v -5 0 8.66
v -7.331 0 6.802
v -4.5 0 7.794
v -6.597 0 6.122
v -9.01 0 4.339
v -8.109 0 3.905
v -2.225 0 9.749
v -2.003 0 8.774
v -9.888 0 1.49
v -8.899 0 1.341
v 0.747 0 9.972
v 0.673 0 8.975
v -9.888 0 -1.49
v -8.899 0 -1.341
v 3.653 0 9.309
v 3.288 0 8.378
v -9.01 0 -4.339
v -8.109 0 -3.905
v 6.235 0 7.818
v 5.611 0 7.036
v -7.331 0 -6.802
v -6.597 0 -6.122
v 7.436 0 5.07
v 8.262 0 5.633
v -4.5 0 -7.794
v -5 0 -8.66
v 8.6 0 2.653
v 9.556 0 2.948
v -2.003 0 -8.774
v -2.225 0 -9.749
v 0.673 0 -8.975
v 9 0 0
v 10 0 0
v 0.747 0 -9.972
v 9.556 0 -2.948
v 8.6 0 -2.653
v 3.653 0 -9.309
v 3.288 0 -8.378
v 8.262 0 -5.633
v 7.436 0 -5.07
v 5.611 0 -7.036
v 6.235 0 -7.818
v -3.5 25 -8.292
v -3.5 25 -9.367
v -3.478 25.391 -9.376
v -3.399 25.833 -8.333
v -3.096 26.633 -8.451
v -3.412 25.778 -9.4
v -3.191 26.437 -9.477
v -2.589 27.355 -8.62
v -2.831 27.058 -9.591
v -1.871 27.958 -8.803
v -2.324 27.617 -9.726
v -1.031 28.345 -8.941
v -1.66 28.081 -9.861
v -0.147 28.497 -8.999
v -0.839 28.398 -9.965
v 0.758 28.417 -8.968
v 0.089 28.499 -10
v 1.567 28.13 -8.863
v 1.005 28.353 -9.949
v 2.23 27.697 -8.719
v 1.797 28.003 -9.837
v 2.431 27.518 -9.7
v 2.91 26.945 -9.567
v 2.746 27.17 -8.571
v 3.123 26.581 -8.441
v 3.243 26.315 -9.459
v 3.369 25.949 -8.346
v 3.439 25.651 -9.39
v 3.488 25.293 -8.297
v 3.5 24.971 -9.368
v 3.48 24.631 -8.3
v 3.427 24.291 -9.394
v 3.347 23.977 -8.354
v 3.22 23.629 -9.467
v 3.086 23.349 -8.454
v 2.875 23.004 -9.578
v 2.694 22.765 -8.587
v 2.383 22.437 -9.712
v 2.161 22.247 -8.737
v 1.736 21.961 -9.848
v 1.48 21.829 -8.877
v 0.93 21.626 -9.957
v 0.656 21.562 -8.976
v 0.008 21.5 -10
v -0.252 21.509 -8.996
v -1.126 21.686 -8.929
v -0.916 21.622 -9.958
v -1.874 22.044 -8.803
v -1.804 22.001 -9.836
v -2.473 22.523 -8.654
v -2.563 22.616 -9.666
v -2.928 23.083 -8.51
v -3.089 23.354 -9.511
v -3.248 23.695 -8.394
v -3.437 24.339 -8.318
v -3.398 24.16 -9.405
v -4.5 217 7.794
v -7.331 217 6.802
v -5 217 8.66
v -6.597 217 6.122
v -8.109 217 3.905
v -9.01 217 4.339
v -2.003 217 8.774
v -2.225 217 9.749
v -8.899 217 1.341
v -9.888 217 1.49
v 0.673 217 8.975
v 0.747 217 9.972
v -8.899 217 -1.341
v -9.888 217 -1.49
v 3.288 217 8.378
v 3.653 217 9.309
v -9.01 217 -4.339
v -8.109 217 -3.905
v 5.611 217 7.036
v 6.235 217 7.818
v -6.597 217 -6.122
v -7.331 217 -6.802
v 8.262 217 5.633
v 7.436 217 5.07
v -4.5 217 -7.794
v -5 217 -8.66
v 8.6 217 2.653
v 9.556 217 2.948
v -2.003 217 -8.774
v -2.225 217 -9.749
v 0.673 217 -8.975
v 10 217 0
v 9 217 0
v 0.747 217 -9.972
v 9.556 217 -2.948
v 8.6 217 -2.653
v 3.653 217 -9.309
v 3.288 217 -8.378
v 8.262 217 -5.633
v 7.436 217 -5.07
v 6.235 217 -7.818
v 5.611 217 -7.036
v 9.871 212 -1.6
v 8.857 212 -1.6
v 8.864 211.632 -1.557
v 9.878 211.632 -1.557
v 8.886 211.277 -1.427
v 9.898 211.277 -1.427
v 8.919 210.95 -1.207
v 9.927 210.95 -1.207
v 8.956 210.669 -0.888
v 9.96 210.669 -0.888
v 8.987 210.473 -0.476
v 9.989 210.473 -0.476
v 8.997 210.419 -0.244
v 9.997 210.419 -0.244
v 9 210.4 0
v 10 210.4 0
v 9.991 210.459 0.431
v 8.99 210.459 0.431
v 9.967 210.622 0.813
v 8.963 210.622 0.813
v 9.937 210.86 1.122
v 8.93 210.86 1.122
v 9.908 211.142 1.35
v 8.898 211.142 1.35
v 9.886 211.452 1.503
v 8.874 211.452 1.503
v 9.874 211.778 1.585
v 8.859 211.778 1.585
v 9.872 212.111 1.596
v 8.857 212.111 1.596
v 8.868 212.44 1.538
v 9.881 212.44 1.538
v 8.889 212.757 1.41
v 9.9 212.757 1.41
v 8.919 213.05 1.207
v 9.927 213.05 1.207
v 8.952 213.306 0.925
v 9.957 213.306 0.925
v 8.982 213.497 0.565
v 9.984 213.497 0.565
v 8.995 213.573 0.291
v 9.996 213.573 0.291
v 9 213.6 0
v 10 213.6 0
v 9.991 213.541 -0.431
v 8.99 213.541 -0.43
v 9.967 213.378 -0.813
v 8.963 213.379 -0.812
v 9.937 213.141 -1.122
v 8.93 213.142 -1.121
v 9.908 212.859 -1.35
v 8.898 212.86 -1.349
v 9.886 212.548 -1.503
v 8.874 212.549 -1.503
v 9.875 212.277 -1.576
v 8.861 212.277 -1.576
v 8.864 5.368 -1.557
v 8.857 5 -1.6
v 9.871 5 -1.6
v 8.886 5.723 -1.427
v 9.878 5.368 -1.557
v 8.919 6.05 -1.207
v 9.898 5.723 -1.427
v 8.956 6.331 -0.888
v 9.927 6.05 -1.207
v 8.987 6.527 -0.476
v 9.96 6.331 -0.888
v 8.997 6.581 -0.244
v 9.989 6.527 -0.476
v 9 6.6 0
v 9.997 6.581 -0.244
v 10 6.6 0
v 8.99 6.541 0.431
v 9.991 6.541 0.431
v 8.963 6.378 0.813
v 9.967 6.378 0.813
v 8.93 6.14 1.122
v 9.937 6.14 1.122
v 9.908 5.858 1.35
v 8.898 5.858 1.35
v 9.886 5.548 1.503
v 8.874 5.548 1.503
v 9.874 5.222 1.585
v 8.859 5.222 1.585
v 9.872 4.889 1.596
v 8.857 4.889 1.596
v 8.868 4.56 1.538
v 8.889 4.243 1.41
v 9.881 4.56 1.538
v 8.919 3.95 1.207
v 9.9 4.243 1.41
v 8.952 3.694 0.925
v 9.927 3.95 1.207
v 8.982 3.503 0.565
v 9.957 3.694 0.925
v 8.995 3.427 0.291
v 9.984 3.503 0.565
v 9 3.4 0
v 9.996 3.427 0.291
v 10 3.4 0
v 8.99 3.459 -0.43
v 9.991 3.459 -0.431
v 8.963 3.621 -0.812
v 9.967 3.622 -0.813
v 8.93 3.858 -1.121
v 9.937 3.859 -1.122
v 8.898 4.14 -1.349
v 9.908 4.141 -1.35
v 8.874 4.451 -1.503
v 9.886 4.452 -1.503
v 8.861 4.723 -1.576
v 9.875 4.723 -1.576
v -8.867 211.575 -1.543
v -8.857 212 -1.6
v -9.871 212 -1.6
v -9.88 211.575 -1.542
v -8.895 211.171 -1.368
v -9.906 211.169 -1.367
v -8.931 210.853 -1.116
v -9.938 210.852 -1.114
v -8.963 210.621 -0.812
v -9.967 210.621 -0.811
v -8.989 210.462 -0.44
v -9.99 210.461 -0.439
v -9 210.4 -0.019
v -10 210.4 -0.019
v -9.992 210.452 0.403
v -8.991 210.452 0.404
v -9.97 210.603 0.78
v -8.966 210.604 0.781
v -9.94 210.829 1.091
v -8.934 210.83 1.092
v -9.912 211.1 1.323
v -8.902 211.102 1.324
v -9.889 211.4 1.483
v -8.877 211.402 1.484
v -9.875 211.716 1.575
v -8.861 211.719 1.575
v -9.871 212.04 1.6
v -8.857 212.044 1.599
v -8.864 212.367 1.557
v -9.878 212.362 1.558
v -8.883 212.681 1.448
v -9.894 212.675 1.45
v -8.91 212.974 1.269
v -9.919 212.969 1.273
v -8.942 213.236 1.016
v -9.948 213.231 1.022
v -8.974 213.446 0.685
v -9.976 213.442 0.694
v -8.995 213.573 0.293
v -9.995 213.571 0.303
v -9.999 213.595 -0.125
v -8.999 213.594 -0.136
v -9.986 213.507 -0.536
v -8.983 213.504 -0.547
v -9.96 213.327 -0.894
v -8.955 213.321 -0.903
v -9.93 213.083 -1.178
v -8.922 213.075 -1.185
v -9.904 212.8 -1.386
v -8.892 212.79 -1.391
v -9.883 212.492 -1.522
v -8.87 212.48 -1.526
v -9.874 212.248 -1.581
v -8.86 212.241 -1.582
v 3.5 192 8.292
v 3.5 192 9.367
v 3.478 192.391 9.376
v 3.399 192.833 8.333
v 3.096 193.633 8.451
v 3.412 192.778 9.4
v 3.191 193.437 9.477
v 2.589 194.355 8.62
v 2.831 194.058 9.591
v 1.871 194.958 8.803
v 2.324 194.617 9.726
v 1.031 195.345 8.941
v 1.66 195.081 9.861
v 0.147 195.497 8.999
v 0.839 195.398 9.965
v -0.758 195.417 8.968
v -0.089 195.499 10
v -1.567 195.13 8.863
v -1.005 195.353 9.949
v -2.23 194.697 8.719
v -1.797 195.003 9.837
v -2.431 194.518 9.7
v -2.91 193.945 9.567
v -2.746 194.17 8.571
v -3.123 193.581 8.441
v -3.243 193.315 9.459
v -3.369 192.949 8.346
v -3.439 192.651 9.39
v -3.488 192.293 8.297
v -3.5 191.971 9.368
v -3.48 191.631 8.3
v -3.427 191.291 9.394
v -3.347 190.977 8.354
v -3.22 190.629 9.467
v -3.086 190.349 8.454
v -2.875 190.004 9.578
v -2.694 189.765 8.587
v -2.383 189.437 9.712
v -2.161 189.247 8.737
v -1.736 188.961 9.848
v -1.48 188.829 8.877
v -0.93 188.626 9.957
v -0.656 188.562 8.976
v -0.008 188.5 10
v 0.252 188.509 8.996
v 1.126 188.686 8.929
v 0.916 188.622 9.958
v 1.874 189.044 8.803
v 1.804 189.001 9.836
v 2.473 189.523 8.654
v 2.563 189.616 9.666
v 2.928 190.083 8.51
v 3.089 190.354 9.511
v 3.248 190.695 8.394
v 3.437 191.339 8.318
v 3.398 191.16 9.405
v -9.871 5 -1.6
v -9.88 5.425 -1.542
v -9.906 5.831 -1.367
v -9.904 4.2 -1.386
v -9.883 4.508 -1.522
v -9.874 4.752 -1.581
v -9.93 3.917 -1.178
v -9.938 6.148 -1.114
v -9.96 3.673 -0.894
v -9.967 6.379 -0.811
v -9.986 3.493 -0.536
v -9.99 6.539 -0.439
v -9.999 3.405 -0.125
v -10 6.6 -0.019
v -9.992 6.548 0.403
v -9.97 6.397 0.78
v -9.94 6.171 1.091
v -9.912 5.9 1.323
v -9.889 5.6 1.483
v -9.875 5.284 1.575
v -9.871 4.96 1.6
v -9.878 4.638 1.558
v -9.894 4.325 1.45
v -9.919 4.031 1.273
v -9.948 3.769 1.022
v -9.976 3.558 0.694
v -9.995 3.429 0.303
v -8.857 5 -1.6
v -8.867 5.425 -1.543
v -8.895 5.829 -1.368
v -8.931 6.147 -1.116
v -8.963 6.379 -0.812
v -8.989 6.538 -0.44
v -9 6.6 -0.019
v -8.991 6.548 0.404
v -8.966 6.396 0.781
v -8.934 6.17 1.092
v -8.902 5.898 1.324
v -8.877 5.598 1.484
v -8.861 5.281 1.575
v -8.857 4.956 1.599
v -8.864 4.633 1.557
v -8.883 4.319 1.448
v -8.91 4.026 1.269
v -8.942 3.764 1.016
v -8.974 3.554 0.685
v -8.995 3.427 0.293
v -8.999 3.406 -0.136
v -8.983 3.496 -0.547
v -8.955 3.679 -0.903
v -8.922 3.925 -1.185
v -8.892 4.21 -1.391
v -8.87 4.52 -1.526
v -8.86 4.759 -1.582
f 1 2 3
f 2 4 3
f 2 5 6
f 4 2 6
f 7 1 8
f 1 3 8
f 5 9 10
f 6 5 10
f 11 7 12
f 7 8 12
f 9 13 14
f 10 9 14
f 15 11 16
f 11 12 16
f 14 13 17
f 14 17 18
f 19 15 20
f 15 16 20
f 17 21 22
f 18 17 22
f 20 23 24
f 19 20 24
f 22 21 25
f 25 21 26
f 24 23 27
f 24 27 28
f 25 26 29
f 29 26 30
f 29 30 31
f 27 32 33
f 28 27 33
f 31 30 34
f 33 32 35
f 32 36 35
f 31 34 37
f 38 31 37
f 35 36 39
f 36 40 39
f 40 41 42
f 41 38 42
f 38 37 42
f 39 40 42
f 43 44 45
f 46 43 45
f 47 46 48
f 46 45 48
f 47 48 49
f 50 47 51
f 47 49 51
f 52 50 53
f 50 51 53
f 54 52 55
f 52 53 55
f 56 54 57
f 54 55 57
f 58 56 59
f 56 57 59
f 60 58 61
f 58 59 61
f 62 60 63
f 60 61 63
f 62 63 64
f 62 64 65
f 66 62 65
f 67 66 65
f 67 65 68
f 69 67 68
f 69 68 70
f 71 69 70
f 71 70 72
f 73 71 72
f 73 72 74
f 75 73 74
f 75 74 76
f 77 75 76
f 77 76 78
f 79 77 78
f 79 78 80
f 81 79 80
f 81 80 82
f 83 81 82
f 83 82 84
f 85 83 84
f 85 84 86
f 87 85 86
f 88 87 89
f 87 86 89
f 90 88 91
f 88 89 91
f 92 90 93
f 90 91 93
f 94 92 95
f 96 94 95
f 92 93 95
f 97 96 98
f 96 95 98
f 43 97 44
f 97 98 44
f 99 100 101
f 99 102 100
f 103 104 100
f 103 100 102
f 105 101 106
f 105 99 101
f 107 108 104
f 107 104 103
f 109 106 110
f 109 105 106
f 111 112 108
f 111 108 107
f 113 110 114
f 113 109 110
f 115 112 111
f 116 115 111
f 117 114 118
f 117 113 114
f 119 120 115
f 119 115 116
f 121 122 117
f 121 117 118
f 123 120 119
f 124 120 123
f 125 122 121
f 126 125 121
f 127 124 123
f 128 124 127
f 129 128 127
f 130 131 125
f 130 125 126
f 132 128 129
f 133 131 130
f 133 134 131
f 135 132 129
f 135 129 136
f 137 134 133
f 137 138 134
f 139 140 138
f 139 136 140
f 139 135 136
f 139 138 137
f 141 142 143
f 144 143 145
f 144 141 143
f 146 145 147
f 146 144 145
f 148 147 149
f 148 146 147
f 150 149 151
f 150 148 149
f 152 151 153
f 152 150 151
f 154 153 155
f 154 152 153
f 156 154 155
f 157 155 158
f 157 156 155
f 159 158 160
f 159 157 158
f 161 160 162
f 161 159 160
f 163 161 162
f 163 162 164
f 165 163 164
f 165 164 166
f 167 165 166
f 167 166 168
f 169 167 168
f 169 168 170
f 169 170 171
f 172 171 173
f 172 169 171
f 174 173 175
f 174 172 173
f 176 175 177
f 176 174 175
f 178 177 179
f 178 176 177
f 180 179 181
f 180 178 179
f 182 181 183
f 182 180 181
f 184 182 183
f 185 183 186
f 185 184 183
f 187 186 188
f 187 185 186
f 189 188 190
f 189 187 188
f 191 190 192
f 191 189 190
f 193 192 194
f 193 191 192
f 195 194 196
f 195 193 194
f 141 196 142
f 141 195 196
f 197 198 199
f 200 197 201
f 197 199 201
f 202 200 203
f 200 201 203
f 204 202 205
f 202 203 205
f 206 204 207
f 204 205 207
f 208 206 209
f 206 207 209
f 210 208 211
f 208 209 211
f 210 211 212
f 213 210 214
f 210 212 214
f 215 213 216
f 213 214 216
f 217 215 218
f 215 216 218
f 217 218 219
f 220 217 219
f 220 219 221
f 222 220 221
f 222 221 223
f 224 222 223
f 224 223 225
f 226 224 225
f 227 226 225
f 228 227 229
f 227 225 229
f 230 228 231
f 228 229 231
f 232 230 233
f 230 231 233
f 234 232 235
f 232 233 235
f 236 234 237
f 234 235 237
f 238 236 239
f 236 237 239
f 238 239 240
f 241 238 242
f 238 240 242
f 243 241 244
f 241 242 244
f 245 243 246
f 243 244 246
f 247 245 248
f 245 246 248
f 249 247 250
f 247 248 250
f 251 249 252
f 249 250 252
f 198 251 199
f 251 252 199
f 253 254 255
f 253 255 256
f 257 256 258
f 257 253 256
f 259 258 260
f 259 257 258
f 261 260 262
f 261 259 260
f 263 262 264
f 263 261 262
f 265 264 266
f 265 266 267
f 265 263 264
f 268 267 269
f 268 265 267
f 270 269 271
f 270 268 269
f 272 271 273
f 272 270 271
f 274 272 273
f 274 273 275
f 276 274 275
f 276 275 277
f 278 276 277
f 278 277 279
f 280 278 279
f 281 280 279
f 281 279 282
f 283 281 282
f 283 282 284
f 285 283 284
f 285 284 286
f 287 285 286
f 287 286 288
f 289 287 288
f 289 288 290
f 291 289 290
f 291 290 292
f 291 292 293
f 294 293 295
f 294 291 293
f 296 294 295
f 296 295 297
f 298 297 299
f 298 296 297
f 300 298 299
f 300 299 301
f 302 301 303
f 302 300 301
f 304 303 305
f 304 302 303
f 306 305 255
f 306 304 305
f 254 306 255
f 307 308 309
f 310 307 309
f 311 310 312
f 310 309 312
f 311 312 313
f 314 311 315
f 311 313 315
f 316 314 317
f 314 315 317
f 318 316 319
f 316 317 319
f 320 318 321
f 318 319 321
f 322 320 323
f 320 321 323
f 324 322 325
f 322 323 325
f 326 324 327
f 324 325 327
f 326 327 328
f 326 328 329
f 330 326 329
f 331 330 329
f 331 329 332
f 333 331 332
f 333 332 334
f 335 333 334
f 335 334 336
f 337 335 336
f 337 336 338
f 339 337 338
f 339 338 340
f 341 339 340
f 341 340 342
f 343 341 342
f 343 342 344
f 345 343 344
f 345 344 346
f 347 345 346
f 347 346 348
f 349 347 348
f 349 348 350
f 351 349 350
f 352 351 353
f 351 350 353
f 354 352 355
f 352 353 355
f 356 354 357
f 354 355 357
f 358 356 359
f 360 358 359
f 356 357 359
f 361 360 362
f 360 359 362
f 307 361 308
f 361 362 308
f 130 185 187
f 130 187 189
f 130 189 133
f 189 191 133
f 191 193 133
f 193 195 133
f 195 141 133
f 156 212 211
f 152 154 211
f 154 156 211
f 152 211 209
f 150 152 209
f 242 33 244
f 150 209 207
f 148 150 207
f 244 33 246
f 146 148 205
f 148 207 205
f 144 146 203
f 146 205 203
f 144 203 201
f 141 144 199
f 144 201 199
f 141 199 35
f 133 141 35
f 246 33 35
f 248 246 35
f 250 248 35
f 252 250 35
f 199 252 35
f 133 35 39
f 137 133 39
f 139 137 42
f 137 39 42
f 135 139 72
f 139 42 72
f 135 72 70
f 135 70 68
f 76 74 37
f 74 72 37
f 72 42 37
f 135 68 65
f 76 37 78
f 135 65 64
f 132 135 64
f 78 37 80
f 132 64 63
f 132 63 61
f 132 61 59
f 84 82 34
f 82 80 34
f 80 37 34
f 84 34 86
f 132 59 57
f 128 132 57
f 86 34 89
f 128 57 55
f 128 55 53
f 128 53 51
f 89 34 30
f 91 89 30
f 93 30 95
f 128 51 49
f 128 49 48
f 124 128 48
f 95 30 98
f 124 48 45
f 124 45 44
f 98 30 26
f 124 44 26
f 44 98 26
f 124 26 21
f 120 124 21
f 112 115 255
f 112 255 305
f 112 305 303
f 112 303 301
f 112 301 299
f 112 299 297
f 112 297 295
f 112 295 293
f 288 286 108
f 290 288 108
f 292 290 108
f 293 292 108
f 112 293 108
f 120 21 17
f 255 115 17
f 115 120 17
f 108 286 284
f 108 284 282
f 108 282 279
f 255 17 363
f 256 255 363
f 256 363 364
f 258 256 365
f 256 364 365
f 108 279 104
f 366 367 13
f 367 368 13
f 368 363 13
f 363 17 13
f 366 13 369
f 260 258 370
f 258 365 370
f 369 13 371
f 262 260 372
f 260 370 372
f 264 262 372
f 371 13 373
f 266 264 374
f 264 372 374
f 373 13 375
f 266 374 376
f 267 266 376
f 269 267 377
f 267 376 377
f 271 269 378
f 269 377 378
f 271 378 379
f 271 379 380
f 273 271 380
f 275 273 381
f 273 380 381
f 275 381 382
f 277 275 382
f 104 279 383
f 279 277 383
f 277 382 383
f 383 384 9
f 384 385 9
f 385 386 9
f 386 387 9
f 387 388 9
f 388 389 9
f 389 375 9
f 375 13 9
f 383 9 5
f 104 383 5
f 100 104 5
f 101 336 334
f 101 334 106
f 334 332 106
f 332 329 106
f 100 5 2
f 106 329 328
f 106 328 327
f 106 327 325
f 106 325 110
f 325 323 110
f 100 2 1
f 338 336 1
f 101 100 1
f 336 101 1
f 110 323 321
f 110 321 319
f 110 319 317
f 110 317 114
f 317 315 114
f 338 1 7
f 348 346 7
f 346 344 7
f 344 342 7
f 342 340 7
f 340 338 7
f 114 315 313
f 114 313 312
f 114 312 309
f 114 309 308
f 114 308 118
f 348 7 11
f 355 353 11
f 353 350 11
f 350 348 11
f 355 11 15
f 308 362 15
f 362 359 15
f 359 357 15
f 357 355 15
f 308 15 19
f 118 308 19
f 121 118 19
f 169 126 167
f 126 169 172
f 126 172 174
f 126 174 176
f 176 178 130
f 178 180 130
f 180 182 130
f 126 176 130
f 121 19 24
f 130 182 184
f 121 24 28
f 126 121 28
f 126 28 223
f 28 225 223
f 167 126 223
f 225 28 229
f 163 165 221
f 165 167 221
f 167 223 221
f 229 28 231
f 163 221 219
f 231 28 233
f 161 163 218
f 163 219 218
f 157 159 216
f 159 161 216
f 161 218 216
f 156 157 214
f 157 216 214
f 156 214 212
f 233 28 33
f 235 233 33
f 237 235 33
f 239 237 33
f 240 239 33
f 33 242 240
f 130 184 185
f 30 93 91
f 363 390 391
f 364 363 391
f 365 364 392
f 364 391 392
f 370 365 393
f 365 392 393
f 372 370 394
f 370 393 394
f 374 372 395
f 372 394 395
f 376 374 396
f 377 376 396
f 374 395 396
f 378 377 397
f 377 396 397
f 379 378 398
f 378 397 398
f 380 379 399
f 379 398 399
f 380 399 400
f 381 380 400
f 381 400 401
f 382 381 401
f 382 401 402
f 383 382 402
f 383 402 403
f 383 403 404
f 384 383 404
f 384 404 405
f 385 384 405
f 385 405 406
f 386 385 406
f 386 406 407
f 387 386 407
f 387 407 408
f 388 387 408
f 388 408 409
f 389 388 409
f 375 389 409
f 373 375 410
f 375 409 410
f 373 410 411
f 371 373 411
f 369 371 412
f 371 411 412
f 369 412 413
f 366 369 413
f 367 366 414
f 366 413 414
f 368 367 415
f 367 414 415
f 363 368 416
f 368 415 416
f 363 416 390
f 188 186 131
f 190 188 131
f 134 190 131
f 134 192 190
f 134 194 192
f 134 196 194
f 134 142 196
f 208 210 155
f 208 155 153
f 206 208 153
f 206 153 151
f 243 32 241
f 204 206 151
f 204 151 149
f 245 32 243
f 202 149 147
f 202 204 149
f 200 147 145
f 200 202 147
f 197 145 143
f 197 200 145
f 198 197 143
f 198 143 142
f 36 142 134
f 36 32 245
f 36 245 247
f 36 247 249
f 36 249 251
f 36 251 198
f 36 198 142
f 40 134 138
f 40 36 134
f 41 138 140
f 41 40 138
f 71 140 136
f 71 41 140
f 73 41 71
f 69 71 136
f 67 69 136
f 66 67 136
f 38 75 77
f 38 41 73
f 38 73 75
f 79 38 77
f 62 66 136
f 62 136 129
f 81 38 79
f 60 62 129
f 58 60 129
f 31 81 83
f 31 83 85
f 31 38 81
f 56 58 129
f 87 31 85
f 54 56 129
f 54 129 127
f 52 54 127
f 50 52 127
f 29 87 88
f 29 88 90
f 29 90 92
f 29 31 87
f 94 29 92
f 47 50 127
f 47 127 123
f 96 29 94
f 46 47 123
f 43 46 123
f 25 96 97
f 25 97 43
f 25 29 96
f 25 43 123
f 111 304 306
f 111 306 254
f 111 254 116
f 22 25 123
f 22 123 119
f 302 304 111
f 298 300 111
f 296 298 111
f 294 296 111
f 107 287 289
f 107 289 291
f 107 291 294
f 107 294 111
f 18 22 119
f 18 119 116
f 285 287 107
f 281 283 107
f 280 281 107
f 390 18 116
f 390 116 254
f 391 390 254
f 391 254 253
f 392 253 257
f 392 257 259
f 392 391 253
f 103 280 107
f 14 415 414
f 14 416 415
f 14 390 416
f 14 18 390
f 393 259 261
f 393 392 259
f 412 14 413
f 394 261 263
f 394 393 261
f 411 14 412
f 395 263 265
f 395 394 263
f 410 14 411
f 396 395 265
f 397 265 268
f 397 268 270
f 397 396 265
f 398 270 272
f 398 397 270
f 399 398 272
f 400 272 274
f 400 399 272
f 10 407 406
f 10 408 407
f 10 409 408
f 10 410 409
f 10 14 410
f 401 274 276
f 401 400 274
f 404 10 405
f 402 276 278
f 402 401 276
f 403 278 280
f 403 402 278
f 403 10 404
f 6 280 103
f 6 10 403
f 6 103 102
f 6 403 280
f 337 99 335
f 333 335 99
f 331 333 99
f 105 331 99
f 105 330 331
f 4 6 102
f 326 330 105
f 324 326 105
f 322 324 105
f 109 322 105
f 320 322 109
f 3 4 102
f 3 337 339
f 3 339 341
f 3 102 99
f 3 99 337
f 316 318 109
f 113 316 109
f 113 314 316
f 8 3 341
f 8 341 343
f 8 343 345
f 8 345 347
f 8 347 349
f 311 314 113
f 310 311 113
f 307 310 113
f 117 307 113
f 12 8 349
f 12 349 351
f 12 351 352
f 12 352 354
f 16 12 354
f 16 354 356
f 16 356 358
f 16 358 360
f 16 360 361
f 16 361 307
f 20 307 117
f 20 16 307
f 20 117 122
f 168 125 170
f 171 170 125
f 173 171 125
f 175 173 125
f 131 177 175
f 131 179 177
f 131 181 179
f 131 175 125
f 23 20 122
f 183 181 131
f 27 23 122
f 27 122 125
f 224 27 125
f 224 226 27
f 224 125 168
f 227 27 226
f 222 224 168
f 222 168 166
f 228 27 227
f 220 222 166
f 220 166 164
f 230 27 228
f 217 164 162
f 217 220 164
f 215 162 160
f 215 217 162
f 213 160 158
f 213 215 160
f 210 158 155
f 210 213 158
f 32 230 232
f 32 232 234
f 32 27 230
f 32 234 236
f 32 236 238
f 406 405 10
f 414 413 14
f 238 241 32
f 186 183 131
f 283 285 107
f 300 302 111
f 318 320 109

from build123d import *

# Parameters (mm, degrees)
SKETCH1_R            = 10
SKETCH1_R_2          = 9
BOSS_EXTRUDE1_DEPTH  = 217
M3_CLEARANCE_HOLE1_D = 3.2
CUT_EXTRUDE1_REACH   = 220.149
SKETCH4_R            = 3.5
CUT_EXTRUDE2_REACH   = 220.149
SKETCH5_R            = 3.5


with BuildPart() as part:
    # Sketch1 → Boss-Extrude1 (new body)
    with BuildSketch(Plane(origin=(0, 0, 0), x_dir=(1, 0, 0), z_dir=(0, 1, 0))):
        Circle(SKETCH1_R)
        Circle(SKETCH1_R_2, mode=Mode.SUBTRACT)
    extrude(amount=BOSS_EXTRUDE1_DEPTH)

    # M3 Clearance Hole1 (through all)
    with Locations(Plane.ZY.offset(10)):
        with Locations((0, 5)):
            m3_clearance_hole1 = Hole(M3_CLEARANCE_HOLE1_D / 2)

    # Mirror1: M3 Clearance Hole1 across plane
    add(m3_clearance_hole1.mirror(Plane.ZX.offset(108.5)), mode=Mode.SUBTRACT)

    # Sketch4 → Cut-Extrude1 (cut, up to next)
    with BuildSketch(Plane(origin=(0, 0, -10), x_dir=(-1, 0, 0), z_dir=(0, 0, -1)), mode=Mode.PRIVATE) as cut_extrude1_sk1:
        with Locations((0, 25)):
            Circle(SKETCH4_R)
    cut_extrude1_tool1 = extrude(cut_extrude1_sk1.sketch, amount=-CUT_EXTRUDE1_REACH, mode=Mode.PRIVATE) & part.part
    add(cut_extrude1_tool1.solids().sort_by_distance((0, 25, -10))[0], mode=Mode.SUBTRACT)

    # Sketch5 → Cut-Extrude2 (cut, up to next)
    with BuildSketch(Plane.XY.offset(10), mode=Mode.PRIVATE) as cut_extrude2_sk1:
        with Locations((0, 192)):
            Circle(SKETCH5_R)
    cut_extrude2_tool1 = extrude(cut_extrude2_sk1.sketch, amount=-CUT_EXTRUDE2_REACH, mode=Mode.PRIVATE) & part.part
    add(cut_extrude2_tool1.solids().sort_by_distance((0, 192, 10))[0], mode=Mode.SUBTRACT)


solid = part.part
